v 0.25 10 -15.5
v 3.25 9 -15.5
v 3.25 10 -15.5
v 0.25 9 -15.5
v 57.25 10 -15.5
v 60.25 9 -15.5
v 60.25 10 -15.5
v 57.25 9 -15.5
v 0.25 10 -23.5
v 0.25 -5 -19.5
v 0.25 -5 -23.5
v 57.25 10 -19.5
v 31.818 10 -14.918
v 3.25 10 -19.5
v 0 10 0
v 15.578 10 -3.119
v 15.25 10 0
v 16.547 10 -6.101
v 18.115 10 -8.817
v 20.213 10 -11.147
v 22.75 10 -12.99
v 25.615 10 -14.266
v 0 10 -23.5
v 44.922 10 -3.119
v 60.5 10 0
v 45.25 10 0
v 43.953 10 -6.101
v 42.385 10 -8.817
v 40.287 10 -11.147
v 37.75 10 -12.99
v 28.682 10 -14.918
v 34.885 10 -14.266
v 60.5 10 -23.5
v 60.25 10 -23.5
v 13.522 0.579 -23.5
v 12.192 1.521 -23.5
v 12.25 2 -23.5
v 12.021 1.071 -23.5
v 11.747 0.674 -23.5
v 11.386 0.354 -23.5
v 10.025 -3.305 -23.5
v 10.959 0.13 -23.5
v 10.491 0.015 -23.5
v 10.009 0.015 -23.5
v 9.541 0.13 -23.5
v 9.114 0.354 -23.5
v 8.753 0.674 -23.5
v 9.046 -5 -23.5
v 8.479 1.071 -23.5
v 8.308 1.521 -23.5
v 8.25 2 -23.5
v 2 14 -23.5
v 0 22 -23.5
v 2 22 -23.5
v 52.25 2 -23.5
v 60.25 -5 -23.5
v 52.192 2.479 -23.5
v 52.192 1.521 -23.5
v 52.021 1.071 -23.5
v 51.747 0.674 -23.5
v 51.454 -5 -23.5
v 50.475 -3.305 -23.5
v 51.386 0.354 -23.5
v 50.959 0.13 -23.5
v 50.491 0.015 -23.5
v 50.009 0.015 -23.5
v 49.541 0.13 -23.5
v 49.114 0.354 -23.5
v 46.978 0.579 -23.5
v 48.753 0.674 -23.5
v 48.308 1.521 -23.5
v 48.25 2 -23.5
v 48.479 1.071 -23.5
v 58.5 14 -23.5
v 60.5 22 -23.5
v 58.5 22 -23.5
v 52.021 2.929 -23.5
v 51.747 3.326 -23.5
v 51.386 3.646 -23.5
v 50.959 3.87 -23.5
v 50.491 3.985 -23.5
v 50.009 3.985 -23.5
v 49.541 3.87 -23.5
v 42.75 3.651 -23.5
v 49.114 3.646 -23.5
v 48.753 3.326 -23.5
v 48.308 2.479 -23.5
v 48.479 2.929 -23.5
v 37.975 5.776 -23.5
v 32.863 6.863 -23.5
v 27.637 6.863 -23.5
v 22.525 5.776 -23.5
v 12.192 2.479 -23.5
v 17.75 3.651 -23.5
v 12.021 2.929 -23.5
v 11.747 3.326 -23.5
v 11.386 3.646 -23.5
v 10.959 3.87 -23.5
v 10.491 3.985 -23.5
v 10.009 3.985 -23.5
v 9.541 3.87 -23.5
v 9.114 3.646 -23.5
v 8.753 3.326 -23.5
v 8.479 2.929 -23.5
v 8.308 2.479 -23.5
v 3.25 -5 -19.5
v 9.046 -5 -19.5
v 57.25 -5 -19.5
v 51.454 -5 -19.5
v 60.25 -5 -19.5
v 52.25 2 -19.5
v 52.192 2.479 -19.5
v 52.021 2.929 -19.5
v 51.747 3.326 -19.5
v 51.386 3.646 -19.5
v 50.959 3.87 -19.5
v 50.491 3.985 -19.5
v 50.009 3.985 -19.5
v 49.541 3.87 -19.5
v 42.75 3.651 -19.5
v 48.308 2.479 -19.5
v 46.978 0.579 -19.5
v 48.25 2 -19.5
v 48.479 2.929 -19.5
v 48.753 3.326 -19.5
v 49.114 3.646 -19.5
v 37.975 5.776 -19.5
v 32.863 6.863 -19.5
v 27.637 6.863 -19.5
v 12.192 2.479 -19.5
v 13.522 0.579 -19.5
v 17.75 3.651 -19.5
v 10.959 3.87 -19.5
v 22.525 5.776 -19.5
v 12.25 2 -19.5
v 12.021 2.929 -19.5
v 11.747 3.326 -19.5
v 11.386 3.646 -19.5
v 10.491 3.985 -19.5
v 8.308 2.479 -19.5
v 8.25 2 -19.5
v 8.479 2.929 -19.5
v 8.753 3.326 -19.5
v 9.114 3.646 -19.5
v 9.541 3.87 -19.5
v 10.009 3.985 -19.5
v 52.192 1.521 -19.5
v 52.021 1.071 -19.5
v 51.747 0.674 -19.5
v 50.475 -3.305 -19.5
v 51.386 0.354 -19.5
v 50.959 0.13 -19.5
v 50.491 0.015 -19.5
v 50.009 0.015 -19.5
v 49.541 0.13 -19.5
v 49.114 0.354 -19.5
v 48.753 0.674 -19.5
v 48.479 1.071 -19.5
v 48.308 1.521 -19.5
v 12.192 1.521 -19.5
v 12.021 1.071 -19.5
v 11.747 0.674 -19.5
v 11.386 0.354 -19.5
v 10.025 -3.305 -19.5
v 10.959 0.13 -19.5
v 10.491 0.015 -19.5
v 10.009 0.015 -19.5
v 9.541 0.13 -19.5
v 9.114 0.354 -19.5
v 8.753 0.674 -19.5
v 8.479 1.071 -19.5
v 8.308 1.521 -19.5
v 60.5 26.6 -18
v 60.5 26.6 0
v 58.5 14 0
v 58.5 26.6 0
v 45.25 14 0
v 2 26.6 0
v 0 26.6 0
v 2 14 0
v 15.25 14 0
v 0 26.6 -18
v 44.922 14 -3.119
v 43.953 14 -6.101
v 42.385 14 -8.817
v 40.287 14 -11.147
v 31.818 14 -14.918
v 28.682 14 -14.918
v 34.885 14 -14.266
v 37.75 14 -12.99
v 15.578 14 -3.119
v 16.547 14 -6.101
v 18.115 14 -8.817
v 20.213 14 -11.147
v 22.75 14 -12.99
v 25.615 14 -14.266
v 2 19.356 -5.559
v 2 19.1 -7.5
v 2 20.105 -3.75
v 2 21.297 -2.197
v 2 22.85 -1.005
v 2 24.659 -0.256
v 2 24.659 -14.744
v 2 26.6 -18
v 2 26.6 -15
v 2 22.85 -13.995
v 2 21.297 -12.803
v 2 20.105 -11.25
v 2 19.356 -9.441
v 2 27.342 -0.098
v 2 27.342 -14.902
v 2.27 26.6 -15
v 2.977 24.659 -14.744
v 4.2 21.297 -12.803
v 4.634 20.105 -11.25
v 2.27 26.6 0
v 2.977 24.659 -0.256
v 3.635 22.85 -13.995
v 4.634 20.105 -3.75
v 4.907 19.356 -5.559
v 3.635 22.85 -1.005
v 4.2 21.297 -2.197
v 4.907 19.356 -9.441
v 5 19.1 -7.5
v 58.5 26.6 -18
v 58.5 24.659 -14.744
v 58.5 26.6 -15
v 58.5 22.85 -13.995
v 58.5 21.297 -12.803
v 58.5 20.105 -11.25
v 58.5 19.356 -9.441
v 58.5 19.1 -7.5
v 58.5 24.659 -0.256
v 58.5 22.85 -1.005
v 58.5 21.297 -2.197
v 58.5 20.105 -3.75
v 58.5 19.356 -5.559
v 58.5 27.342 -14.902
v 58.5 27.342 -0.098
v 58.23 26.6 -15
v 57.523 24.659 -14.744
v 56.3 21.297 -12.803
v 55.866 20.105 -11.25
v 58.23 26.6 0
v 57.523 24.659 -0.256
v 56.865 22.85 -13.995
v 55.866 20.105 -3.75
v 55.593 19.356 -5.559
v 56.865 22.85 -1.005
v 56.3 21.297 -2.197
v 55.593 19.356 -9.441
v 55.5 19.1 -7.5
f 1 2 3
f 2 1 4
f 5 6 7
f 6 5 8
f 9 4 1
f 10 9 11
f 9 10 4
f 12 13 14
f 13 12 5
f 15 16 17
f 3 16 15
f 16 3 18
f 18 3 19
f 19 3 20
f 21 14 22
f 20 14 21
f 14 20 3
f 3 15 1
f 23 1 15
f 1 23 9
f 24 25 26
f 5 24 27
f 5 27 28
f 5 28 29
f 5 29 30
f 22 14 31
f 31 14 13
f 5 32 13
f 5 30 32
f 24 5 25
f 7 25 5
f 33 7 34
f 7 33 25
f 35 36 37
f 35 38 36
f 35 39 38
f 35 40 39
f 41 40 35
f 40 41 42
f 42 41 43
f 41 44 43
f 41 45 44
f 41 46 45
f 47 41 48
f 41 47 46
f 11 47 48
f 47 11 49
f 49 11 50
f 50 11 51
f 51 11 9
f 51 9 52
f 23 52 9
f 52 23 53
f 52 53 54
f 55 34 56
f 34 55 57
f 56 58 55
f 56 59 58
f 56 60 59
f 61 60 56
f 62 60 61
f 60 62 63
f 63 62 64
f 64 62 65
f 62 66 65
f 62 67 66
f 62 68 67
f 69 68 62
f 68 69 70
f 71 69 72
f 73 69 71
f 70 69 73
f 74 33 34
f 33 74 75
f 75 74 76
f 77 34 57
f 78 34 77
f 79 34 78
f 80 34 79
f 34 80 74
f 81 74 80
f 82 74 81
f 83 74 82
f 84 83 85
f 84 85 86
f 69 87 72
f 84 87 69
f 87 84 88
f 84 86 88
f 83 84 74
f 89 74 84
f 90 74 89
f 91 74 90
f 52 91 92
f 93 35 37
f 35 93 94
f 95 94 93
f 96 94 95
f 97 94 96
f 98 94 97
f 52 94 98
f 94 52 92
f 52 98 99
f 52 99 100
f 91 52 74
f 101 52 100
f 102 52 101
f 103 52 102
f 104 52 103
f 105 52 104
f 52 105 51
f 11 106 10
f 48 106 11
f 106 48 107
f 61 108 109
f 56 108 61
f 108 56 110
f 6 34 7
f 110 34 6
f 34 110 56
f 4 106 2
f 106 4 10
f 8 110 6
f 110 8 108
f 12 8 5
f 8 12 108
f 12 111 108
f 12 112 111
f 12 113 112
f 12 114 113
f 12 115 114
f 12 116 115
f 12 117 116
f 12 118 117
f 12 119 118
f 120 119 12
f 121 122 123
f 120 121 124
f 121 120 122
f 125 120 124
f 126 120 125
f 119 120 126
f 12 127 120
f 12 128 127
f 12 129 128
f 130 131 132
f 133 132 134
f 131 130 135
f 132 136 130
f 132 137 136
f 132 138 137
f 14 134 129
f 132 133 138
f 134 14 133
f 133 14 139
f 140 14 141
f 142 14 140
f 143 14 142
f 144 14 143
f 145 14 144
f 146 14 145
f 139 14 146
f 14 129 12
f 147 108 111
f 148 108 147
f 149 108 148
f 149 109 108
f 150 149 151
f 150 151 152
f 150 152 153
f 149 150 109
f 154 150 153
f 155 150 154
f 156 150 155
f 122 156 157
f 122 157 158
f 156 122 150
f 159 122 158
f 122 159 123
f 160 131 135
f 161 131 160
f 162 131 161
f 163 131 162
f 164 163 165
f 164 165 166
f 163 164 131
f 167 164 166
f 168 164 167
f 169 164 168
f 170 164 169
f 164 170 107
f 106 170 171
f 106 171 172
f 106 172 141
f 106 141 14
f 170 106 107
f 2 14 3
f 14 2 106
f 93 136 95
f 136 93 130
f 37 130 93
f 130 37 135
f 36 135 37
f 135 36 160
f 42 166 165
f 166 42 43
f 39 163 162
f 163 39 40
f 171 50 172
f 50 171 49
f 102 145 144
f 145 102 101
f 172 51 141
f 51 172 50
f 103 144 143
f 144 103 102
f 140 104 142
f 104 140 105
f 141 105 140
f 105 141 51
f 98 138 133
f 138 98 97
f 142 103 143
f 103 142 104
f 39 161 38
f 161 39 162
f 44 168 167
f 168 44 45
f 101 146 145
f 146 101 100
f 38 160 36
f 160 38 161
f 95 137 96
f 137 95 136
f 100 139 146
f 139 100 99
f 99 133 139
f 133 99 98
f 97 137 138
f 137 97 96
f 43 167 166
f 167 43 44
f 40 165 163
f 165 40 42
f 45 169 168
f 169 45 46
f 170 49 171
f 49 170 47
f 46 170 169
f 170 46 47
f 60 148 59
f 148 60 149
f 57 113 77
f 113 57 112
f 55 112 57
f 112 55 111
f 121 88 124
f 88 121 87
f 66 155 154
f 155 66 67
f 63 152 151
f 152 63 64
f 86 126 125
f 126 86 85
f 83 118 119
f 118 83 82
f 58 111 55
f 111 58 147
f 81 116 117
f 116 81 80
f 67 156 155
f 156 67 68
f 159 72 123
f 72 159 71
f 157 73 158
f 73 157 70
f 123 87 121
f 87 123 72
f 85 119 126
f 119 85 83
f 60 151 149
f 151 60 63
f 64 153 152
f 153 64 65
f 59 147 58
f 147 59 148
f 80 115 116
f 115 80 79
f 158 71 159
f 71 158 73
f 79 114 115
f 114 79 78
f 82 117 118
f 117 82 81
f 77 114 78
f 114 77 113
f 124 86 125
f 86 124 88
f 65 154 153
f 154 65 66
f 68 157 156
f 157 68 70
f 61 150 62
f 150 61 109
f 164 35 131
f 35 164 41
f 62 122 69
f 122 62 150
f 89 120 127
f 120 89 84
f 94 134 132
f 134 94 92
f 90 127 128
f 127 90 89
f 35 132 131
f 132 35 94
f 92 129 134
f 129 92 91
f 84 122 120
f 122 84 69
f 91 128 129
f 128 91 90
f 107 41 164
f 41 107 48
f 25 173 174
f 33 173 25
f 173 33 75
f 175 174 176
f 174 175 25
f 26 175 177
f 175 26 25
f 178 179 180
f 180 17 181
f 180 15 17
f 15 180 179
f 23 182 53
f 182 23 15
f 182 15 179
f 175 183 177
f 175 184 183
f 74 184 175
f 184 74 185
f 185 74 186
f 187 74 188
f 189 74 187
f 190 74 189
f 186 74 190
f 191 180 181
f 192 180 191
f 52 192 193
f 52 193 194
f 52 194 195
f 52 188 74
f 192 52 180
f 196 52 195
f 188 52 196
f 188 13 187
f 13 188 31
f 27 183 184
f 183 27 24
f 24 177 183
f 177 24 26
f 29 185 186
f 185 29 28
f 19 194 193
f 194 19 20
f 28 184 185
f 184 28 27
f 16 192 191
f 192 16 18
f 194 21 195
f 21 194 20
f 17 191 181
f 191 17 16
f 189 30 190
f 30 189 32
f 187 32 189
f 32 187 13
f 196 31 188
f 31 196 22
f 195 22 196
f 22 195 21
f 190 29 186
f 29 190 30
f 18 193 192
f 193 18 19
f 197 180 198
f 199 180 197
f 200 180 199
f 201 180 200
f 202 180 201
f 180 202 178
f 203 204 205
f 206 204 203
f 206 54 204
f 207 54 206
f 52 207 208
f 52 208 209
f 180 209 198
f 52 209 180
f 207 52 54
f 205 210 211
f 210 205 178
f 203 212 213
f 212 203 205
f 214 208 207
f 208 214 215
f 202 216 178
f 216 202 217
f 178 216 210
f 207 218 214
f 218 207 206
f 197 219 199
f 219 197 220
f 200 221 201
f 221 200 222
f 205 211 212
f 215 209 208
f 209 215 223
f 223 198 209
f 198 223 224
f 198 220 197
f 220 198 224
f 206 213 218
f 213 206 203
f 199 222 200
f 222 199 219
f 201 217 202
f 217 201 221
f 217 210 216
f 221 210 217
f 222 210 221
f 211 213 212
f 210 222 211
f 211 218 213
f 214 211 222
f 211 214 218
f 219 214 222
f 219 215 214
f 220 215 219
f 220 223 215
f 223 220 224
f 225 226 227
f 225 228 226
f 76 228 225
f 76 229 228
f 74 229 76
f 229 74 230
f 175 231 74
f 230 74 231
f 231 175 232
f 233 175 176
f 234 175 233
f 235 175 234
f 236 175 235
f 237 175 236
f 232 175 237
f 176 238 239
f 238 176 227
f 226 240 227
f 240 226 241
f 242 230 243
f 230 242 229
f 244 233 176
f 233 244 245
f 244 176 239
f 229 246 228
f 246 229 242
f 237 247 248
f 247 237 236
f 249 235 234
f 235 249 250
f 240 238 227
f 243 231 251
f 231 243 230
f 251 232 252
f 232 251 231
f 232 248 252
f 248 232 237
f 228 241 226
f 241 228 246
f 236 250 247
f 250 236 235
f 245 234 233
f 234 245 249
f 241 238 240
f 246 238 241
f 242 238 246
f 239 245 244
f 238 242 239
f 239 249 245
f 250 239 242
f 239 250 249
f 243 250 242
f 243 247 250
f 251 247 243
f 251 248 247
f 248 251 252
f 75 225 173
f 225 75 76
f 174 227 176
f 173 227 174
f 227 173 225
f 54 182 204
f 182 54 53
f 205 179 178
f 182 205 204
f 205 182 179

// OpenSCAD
pegWidth = 15;
boardWidth = 4;
mountWidth = 56.5;
hole2Front = 5.6 - boardWidth;
boardFront = 10;
boardHeight = 16+7.5;
fanHoleFromEdge = 5;
fanSize = 50;
screwDiameter = 4;
fanSizeMount = fanSize+10;
hotEndSpaceRadius = 15;
armWidth = 2;

mirror([0,0,1]){
union(){
translate([((mountWidth+(armWidth*2))-fanSizeMount)/2,boardFront-1,boardHeight-(boardWidth*2)]){
difference(){
	difference(){
		difference(){
			hull(){
				cube([fanSizeMount,1,boardWidth*2]);
				translate([0,-14,boardWidth]){
					cube([fanSizeMount,15,boardWidth]);
				}
			}
			translate([3,-14,0]){
				cube([fanSizeMount-6,16,boardWidth]);
			}
		}
		translate([((fanSizeMount-fanSize)/2)+fanHoleFromEdge,-7,boardWidth-1]){
				cylinder(r=screwDiameter/2,h=boardWidth+2,$fs=0.5);
			translate([fanSize-(fanHoleFromEdge*2),0,0]){
					cylinder(r=screwDiameter/2,h=boardWidth+2,$fs=0.5);
			}
		}
	}
	translate([fanSizeMount/2,-27,boardWidth-1]){
		cylinder(r=25,h=boardWidth+2,$fs=0.5);
	}
}
}

		difference(){
			translate([0,boardFront,0]){
				cube([mountWidth+(armWidth*2),boardWidth,boardHeight]);
			}
			translate([(mountWidth+(armWidth*2))/2,boardFront+boardWidth+1,0]){
				rotate([90,0,0]){
					cylinder(r=hotEndSpaceRadius,h=boardWidth+2,$fs=0.5);
				}
			}
		}

		translate([mountWidth+(armWidth*2),0,0]){
			mirror([1,0,0]){
				translate([0,boardFront+boardWidth,0]){
					cube([armWidth,1,boardHeight]);
				}
				hull(){
					translate([0,boardFront+armWidth,0]){
						cube([armWidth,10,boardHeight]);
					}
					translate([0,boardFront+hole2Front+pegWidth-1,0]){
						cube([armWidth,1,pegWidth+3]);
					}
				}
				difference(){
					difference(){
						translate([armWidth,boardFront+hole2Front+pegWidth,pegWidth/2]){
							rotate([90,0,90]){
							  	cylinder(r=pegWidth/2,h=boardWidth-1);
							}	
						}
						translate([boardWidth-1,boardFront+hole2Front+pegWidth,0]){
							cube([boardWidth+2,10,boardHeight]);
						}
					}
					translate([boardWidth-1+armWidth,boardFront+hole2Front+(pegWidth/2),0]){
						rotate([0,0,20]){
							cube([boardWidth+5,pegWidth+5,boardHeight]);
						}
					}
				}
			}
		}

		translate([0,boardFront+boardWidth,0]){
			cube([armWidth,1,boardHeight]);
		}
		hull(){
			translate([0,boardFront+armWidth,0]){
				cube([armWidth,10,boardHeight]);
			}
			translate([0,boardFront+hole2Front+pegWidth-1,0]){
				cube([armWidth,1,pegWidth+3]);
			}
		}
		difference(){
			difference(){
				translate([armWidth,boardFront+hole2Front+pegWidth,pegWidth/2]){
					rotate([90,0,90]){
					  	cylinder(r=pegWidth/2,h=boardWidth-1);
					}	
				}
				translate([boardWidth-1,boardFront+hole2Front+pegWidth,0]){
					cube([boardWidth+2,10,boardHeight]);
				}
			}
			translate([boardWidth-1+armWidth,boardFront+hole2Front+(pegWidth/2),0]){
				rotate([0,0,20]){
					cube([boardWidth+5,pegWidth+5,boardHeight]);
				}
			}
		}
	}
}
